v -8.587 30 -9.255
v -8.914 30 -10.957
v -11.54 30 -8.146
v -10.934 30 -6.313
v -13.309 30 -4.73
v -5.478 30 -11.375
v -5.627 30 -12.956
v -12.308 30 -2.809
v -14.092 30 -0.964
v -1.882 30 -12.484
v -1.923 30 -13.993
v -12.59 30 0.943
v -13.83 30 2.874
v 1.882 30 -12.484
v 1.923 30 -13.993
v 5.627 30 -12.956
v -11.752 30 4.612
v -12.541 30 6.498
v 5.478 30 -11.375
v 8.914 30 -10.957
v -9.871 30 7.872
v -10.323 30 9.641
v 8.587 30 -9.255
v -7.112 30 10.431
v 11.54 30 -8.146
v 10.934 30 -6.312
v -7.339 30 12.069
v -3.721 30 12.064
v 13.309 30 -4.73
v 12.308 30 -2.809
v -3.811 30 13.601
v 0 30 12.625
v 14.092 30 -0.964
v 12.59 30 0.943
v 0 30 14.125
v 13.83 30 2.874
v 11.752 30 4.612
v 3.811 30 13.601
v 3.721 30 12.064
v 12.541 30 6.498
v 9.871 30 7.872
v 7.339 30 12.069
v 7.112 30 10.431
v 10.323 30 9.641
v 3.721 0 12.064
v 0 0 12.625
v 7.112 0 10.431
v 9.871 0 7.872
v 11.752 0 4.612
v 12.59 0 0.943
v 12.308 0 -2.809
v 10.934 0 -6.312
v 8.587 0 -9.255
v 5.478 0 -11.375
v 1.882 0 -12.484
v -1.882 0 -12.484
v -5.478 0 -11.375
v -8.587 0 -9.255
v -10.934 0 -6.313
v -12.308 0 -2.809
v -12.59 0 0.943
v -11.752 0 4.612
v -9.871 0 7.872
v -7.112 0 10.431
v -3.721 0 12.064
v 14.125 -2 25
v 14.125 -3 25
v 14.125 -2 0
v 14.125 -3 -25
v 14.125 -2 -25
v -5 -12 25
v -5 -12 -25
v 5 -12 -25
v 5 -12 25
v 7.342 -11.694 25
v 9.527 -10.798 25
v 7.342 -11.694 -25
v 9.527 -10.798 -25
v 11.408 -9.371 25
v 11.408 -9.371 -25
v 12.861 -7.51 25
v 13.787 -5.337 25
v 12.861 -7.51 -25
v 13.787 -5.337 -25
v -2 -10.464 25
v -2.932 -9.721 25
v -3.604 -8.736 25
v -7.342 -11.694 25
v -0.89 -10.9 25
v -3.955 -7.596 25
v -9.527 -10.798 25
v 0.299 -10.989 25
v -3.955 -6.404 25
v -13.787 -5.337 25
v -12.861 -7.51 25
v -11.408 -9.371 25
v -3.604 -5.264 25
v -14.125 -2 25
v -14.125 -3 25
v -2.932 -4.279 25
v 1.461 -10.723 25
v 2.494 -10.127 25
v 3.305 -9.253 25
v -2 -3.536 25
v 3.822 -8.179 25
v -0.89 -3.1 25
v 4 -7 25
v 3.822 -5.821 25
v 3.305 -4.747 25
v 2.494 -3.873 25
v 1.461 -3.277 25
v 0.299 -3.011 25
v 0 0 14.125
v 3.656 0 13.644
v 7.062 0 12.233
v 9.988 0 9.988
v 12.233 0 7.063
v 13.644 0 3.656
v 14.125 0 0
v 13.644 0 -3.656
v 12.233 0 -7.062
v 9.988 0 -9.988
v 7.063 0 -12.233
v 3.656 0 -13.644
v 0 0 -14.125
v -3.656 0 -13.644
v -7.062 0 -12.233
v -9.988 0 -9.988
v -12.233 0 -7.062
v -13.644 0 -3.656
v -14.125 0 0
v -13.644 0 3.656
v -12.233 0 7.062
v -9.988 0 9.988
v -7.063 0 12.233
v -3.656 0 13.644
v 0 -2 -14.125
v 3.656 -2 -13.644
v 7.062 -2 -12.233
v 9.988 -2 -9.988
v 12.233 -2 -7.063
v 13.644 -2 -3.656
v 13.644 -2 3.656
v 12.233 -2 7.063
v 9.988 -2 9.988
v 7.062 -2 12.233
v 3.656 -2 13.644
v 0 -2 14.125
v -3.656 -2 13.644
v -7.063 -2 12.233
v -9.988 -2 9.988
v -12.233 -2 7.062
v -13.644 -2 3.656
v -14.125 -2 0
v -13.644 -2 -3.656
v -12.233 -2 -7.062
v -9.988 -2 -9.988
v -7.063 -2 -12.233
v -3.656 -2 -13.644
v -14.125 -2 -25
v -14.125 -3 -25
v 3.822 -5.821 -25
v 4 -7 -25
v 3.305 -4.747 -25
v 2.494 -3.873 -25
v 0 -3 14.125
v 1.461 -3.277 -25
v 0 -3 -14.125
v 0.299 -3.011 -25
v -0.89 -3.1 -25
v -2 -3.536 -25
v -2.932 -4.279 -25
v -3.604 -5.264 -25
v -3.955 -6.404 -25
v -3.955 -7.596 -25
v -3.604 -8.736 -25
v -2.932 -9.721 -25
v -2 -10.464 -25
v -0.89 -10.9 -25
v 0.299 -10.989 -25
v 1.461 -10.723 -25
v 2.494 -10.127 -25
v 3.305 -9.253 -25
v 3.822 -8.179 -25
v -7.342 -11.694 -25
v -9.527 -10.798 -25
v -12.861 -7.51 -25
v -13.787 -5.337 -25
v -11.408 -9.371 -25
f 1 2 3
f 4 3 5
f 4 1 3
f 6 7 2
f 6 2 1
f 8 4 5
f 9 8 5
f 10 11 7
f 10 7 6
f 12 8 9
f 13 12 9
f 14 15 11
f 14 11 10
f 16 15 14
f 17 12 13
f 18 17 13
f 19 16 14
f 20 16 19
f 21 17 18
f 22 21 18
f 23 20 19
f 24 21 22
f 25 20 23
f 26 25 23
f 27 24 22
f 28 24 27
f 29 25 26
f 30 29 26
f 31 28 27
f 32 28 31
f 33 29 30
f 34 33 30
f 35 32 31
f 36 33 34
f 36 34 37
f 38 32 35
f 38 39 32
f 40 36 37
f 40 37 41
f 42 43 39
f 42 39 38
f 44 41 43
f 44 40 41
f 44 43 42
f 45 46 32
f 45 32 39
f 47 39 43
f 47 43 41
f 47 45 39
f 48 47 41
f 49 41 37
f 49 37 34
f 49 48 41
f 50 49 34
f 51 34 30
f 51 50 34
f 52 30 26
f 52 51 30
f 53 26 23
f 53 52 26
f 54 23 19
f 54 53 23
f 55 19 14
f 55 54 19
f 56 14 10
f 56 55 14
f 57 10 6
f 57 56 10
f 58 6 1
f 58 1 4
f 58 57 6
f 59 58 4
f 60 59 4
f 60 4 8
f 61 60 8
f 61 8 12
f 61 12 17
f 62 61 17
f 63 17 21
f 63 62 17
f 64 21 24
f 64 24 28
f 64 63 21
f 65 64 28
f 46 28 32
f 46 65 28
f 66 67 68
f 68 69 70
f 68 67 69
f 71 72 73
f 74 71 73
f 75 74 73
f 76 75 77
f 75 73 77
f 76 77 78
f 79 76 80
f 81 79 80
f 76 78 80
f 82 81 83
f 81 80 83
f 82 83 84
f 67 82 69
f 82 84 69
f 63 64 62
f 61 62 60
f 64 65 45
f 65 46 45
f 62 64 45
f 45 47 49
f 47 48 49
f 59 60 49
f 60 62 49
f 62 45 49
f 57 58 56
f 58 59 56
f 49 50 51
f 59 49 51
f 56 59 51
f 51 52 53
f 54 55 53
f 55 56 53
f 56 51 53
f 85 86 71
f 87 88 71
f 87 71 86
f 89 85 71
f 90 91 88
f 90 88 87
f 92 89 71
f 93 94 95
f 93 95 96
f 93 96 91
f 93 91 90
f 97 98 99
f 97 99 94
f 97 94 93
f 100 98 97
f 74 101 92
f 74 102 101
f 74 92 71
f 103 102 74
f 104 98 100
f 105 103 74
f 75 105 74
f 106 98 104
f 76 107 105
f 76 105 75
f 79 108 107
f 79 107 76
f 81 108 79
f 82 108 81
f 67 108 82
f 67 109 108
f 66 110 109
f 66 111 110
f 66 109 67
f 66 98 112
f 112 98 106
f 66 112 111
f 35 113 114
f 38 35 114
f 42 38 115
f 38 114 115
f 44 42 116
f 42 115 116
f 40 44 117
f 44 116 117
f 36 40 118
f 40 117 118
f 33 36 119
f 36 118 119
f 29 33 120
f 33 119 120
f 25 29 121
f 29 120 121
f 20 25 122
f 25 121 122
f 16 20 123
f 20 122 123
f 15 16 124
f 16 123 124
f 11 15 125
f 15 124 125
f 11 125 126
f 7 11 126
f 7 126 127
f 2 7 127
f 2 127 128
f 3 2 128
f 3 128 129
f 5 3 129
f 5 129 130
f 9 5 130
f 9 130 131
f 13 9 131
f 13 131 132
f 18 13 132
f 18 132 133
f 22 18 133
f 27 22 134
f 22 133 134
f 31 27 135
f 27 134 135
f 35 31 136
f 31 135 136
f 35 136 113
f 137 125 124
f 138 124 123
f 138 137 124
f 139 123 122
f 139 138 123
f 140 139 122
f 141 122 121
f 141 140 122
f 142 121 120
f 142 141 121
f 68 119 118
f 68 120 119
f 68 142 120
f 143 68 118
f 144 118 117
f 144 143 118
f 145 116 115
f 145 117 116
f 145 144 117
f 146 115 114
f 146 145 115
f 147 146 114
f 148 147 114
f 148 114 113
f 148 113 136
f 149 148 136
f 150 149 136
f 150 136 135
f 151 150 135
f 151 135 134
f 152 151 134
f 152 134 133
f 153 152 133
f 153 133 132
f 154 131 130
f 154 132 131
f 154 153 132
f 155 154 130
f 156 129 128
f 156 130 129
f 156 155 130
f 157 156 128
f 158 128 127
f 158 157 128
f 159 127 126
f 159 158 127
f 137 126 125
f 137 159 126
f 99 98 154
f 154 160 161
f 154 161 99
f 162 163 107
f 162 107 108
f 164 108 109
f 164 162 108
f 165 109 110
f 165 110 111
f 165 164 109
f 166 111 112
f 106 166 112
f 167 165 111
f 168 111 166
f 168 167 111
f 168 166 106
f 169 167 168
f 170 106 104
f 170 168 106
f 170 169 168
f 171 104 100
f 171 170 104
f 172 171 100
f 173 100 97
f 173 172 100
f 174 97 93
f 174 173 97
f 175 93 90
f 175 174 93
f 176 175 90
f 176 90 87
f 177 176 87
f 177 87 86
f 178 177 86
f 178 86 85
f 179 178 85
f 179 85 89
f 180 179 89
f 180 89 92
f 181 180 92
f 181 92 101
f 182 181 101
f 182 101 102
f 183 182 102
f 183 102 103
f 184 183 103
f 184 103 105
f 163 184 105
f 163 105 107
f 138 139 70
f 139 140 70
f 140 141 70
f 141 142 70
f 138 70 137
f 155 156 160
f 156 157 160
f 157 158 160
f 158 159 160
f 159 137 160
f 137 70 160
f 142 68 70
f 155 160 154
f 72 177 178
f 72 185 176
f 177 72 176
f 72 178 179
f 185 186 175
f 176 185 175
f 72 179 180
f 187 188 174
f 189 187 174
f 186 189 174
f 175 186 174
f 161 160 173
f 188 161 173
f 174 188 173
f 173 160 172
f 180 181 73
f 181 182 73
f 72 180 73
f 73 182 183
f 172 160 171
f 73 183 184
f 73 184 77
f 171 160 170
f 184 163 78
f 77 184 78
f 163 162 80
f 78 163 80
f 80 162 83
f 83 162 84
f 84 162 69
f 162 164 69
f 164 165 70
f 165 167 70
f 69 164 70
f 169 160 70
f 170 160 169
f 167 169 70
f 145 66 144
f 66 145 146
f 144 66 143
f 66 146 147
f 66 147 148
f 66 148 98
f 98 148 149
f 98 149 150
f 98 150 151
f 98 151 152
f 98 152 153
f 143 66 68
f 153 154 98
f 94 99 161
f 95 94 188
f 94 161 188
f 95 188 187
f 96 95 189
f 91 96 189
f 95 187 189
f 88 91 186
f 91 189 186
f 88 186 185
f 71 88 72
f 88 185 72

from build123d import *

# Parameters (mm, degrees)
SKETCH1_R                = 14.125
SKETCH1_R_2              = 12.625
BOSS_EXTRUDE1_DEPTH      = 30
BOSS_EXTRUDE2_START      = 3
SKETCH2_R                = 14.125
BOSS_EXTRUDE2_DEPTH      = 3
BOSS_EXTRUDE3_DEPTH      = 25
BOSS_EXTRUDE3_DEPTH_BACK = 25
SKETCH3_R                = 4


with BuildPart() as part:
    # Sketch1 → Boss-Extrude1 (new body)
    with BuildSketch(Plane(origin=(0, 0, 0), x_dir=(1, 0, 0), z_dir=(0, 1, 0))):
        Circle(SKETCH1_R)
        Circle(SKETCH1_R_2, mode=Mode.SUBTRACT)
    extrude(amount=BOSS_EXTRUDE1_DEPTH)

    # Sketch2 → Boss-Extrude2 (add)
    with BuildSketch(Plane(origin=(0, 0, 0), x_dir=(-1, 0, 0), z_dir=(0, -1, 0)).offset(BOSS_EXTRUDE2_START)):
        Circle(SKETCH2_R)
    extrude(amount=-BOSS_EXTRUDE2_DEPTH)

    # Sketch3 → Boss-Extrude3 (add, two sides: drawn at the far end of the back side and taken through both)
    with BuildSketch(Plane.XY.offset(-BOSS_EXTRUDE3_DEPTH_BACK)):
        with BuildLine():
            Line((14.125, -2), (-14.125, -2))
            Line((-14.125, -2), (-14.125, -3))
            ThreePointArc((-14.125, -3), (-11.408307596, -9.371443813), (-5, -12))
            Line((-5, -12), (5, -12))
            ThreePointArc((5, -12), (11.408307596, -9.371443813), (14.125, -3))
            Line((14.125, -3), (14.125, -2))
        make_face()
        with Locations((0, -7)):
            Circle(SKETCH3_R, mode=Mode.SUBTRACT)
    extrude(amount=BOSS_EXTRUDE3_DEPTH + BOSS_EXTRUDE3_DEPTH_BACK)


solid = part.part
